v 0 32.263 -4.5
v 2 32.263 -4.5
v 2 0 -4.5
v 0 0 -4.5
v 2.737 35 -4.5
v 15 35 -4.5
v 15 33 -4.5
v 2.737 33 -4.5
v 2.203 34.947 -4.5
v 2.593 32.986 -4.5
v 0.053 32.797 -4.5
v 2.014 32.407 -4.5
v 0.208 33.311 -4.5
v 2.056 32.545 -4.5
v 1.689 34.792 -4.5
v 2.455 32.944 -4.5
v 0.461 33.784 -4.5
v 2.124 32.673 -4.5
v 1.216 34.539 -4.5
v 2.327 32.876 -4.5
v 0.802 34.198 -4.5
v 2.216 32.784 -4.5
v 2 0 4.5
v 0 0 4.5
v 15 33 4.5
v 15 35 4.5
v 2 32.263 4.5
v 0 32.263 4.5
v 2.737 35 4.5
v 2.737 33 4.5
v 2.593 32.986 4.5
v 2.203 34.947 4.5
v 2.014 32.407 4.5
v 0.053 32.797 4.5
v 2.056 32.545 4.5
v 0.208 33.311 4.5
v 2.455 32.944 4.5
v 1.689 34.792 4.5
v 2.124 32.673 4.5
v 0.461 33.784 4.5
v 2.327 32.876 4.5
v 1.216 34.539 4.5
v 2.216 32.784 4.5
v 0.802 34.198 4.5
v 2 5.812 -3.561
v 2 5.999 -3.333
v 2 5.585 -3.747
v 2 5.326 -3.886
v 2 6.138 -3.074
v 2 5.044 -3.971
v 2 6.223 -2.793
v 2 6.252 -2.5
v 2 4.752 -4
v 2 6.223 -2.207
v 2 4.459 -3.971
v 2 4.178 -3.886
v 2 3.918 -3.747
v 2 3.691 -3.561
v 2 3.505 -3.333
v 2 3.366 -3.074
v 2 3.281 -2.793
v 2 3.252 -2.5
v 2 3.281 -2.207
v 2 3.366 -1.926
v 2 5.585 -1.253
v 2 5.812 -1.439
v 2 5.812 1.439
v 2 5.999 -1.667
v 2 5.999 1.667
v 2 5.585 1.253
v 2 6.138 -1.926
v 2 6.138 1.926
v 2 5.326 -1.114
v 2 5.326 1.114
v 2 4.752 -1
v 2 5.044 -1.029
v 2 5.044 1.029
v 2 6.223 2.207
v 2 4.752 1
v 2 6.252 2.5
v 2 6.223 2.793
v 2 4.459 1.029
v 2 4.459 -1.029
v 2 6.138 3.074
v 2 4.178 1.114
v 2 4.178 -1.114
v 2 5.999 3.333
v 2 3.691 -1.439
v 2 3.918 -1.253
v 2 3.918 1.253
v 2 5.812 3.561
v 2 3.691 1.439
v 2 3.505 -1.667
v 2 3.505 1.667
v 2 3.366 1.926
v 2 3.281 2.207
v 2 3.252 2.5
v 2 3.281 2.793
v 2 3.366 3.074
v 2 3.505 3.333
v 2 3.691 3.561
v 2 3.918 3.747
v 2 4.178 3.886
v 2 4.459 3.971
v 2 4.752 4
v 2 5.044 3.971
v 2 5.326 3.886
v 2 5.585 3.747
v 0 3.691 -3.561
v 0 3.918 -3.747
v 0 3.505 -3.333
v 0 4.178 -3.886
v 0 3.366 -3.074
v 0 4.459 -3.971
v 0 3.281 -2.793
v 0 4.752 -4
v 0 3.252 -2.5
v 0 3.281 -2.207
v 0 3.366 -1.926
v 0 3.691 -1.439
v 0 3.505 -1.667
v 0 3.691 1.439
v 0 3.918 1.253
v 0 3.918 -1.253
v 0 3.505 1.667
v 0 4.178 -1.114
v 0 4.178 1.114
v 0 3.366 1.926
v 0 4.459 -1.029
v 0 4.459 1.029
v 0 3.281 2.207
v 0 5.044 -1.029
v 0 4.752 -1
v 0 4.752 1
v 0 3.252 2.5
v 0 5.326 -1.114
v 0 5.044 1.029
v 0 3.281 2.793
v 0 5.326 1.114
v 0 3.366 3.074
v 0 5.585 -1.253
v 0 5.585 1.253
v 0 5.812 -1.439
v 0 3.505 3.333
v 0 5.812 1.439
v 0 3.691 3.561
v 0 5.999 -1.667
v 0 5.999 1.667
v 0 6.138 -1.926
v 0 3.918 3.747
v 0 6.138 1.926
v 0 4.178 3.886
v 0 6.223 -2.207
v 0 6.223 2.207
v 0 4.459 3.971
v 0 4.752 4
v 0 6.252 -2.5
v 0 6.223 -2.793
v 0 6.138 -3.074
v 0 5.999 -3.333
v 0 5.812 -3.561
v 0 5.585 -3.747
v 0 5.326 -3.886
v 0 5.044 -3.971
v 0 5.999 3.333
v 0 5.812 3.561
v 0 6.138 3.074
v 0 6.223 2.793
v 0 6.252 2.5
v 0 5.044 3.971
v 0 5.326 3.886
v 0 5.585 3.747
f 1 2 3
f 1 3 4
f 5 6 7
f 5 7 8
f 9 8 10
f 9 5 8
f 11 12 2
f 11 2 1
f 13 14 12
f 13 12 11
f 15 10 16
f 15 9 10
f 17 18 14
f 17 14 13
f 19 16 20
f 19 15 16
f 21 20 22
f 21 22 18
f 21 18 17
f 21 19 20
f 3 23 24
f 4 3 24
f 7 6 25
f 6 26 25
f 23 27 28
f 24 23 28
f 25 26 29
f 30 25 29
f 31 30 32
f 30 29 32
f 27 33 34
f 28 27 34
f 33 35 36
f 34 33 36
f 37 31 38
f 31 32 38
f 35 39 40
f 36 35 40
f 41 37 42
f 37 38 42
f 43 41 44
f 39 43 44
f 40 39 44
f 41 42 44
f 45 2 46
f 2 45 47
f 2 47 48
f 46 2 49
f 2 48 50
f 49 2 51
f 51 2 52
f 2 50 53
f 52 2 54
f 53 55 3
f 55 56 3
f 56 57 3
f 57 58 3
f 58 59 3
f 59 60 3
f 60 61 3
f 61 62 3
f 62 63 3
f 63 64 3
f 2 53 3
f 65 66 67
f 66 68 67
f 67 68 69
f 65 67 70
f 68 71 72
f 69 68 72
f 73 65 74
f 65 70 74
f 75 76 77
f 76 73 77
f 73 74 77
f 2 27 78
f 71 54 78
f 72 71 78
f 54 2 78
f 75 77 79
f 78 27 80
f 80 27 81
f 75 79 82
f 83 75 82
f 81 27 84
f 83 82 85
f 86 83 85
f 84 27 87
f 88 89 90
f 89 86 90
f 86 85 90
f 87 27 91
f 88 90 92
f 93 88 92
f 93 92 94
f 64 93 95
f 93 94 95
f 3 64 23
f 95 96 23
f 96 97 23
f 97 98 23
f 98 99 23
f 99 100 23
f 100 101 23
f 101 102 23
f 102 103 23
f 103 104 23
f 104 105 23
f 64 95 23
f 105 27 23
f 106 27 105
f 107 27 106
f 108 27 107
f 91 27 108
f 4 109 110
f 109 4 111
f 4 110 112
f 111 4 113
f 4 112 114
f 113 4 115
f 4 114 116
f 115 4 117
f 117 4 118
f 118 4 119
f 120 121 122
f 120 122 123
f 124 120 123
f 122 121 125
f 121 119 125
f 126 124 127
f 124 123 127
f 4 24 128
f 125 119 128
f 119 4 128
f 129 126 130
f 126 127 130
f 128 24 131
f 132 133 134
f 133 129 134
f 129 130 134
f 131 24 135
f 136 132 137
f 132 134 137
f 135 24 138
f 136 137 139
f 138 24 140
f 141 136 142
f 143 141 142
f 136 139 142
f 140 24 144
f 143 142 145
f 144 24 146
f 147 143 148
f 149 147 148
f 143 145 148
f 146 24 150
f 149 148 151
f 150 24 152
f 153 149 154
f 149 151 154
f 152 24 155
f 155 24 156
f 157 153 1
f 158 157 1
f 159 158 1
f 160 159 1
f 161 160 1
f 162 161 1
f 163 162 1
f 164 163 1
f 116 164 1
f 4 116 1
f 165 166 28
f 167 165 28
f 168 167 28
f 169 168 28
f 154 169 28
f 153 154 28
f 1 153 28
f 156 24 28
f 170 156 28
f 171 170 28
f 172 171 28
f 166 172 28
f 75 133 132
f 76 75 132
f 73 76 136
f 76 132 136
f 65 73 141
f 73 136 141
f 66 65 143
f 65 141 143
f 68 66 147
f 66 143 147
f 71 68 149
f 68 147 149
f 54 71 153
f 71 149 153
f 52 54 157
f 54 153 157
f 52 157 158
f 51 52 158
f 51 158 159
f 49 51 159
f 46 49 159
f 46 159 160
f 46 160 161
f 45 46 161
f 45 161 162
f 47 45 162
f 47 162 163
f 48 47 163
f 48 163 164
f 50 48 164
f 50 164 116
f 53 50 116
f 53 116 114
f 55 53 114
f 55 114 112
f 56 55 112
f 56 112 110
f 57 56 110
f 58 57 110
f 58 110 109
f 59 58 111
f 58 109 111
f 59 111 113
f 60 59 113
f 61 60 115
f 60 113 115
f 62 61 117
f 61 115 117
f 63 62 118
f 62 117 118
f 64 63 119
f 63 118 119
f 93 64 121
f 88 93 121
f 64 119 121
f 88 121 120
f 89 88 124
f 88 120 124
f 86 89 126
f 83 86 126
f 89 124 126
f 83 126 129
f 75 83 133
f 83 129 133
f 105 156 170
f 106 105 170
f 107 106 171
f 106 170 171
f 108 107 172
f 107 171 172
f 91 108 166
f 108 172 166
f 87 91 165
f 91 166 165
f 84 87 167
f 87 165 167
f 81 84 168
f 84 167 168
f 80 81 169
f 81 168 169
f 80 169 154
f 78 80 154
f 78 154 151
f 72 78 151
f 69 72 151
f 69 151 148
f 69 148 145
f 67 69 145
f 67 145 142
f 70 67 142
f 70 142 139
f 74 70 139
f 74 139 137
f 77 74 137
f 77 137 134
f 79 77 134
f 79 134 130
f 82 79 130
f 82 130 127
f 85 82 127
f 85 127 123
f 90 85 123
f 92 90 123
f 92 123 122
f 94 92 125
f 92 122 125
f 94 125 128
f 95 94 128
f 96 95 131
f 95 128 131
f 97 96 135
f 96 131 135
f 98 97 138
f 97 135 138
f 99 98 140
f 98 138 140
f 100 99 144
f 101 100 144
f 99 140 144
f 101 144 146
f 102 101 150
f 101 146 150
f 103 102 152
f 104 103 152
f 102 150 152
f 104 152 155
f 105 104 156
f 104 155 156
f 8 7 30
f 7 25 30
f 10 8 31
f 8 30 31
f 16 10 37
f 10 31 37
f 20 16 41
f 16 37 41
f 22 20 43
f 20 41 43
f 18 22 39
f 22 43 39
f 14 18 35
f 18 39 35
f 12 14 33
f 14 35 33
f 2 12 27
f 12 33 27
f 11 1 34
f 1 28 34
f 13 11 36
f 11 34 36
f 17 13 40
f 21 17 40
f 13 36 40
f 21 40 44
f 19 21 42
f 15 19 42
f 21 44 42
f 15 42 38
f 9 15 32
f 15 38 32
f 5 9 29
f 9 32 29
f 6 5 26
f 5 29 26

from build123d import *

# Parameters (mm, degrees)
SM_BASE_FLANGE_1_DEPTH = 4.5
SKETCH_6_R             = 1.5
CUT_EXTRUDE_1_DEPTH    = 10


# Sheet-metal steps are written as plain solids
with BuildPart() as part:
    # Sketch 1 → 基体-法兰1 (new, symmetric)
    with BuildSketch(Plane.XY):
        with BuildLine():
            Line((0, 0), (0, 32.2634))
            ThreePointArc((0, 32.2634), (0.801531583, 34.198468417), (2.7366, 35))
            Line((2.7366, 35), (15, 35))
            Line((15, 35), (15, 33))
            Line((15, 33), (2.7366, 33))
            ThreePointArc((2.7366, 33), (2.215745145, 32.784254855), (2, 32.2634))
            Line((2, 32.2634), (2, 0))
            Line((2, 0), (0, 0))
        make_face()
    extrude(amount=SM_BASE_FLANGE_1_DEPTH, both=True)

    # 草图6 → 切除-拉伸1 (cut)
    with BuildSketch(Plane.ZY):
        with Locations((2.5, 4.75181822)):
            Circle(SKETCH_6_R)
        with Locations((-2.5, 4.75181822)):
            Circle(SKETCH_6_R)
    extrude(amount=-CUT_EXTRUDE_1_DEPTH, mode=Mode.SUBTRACT)


solid = part.part
